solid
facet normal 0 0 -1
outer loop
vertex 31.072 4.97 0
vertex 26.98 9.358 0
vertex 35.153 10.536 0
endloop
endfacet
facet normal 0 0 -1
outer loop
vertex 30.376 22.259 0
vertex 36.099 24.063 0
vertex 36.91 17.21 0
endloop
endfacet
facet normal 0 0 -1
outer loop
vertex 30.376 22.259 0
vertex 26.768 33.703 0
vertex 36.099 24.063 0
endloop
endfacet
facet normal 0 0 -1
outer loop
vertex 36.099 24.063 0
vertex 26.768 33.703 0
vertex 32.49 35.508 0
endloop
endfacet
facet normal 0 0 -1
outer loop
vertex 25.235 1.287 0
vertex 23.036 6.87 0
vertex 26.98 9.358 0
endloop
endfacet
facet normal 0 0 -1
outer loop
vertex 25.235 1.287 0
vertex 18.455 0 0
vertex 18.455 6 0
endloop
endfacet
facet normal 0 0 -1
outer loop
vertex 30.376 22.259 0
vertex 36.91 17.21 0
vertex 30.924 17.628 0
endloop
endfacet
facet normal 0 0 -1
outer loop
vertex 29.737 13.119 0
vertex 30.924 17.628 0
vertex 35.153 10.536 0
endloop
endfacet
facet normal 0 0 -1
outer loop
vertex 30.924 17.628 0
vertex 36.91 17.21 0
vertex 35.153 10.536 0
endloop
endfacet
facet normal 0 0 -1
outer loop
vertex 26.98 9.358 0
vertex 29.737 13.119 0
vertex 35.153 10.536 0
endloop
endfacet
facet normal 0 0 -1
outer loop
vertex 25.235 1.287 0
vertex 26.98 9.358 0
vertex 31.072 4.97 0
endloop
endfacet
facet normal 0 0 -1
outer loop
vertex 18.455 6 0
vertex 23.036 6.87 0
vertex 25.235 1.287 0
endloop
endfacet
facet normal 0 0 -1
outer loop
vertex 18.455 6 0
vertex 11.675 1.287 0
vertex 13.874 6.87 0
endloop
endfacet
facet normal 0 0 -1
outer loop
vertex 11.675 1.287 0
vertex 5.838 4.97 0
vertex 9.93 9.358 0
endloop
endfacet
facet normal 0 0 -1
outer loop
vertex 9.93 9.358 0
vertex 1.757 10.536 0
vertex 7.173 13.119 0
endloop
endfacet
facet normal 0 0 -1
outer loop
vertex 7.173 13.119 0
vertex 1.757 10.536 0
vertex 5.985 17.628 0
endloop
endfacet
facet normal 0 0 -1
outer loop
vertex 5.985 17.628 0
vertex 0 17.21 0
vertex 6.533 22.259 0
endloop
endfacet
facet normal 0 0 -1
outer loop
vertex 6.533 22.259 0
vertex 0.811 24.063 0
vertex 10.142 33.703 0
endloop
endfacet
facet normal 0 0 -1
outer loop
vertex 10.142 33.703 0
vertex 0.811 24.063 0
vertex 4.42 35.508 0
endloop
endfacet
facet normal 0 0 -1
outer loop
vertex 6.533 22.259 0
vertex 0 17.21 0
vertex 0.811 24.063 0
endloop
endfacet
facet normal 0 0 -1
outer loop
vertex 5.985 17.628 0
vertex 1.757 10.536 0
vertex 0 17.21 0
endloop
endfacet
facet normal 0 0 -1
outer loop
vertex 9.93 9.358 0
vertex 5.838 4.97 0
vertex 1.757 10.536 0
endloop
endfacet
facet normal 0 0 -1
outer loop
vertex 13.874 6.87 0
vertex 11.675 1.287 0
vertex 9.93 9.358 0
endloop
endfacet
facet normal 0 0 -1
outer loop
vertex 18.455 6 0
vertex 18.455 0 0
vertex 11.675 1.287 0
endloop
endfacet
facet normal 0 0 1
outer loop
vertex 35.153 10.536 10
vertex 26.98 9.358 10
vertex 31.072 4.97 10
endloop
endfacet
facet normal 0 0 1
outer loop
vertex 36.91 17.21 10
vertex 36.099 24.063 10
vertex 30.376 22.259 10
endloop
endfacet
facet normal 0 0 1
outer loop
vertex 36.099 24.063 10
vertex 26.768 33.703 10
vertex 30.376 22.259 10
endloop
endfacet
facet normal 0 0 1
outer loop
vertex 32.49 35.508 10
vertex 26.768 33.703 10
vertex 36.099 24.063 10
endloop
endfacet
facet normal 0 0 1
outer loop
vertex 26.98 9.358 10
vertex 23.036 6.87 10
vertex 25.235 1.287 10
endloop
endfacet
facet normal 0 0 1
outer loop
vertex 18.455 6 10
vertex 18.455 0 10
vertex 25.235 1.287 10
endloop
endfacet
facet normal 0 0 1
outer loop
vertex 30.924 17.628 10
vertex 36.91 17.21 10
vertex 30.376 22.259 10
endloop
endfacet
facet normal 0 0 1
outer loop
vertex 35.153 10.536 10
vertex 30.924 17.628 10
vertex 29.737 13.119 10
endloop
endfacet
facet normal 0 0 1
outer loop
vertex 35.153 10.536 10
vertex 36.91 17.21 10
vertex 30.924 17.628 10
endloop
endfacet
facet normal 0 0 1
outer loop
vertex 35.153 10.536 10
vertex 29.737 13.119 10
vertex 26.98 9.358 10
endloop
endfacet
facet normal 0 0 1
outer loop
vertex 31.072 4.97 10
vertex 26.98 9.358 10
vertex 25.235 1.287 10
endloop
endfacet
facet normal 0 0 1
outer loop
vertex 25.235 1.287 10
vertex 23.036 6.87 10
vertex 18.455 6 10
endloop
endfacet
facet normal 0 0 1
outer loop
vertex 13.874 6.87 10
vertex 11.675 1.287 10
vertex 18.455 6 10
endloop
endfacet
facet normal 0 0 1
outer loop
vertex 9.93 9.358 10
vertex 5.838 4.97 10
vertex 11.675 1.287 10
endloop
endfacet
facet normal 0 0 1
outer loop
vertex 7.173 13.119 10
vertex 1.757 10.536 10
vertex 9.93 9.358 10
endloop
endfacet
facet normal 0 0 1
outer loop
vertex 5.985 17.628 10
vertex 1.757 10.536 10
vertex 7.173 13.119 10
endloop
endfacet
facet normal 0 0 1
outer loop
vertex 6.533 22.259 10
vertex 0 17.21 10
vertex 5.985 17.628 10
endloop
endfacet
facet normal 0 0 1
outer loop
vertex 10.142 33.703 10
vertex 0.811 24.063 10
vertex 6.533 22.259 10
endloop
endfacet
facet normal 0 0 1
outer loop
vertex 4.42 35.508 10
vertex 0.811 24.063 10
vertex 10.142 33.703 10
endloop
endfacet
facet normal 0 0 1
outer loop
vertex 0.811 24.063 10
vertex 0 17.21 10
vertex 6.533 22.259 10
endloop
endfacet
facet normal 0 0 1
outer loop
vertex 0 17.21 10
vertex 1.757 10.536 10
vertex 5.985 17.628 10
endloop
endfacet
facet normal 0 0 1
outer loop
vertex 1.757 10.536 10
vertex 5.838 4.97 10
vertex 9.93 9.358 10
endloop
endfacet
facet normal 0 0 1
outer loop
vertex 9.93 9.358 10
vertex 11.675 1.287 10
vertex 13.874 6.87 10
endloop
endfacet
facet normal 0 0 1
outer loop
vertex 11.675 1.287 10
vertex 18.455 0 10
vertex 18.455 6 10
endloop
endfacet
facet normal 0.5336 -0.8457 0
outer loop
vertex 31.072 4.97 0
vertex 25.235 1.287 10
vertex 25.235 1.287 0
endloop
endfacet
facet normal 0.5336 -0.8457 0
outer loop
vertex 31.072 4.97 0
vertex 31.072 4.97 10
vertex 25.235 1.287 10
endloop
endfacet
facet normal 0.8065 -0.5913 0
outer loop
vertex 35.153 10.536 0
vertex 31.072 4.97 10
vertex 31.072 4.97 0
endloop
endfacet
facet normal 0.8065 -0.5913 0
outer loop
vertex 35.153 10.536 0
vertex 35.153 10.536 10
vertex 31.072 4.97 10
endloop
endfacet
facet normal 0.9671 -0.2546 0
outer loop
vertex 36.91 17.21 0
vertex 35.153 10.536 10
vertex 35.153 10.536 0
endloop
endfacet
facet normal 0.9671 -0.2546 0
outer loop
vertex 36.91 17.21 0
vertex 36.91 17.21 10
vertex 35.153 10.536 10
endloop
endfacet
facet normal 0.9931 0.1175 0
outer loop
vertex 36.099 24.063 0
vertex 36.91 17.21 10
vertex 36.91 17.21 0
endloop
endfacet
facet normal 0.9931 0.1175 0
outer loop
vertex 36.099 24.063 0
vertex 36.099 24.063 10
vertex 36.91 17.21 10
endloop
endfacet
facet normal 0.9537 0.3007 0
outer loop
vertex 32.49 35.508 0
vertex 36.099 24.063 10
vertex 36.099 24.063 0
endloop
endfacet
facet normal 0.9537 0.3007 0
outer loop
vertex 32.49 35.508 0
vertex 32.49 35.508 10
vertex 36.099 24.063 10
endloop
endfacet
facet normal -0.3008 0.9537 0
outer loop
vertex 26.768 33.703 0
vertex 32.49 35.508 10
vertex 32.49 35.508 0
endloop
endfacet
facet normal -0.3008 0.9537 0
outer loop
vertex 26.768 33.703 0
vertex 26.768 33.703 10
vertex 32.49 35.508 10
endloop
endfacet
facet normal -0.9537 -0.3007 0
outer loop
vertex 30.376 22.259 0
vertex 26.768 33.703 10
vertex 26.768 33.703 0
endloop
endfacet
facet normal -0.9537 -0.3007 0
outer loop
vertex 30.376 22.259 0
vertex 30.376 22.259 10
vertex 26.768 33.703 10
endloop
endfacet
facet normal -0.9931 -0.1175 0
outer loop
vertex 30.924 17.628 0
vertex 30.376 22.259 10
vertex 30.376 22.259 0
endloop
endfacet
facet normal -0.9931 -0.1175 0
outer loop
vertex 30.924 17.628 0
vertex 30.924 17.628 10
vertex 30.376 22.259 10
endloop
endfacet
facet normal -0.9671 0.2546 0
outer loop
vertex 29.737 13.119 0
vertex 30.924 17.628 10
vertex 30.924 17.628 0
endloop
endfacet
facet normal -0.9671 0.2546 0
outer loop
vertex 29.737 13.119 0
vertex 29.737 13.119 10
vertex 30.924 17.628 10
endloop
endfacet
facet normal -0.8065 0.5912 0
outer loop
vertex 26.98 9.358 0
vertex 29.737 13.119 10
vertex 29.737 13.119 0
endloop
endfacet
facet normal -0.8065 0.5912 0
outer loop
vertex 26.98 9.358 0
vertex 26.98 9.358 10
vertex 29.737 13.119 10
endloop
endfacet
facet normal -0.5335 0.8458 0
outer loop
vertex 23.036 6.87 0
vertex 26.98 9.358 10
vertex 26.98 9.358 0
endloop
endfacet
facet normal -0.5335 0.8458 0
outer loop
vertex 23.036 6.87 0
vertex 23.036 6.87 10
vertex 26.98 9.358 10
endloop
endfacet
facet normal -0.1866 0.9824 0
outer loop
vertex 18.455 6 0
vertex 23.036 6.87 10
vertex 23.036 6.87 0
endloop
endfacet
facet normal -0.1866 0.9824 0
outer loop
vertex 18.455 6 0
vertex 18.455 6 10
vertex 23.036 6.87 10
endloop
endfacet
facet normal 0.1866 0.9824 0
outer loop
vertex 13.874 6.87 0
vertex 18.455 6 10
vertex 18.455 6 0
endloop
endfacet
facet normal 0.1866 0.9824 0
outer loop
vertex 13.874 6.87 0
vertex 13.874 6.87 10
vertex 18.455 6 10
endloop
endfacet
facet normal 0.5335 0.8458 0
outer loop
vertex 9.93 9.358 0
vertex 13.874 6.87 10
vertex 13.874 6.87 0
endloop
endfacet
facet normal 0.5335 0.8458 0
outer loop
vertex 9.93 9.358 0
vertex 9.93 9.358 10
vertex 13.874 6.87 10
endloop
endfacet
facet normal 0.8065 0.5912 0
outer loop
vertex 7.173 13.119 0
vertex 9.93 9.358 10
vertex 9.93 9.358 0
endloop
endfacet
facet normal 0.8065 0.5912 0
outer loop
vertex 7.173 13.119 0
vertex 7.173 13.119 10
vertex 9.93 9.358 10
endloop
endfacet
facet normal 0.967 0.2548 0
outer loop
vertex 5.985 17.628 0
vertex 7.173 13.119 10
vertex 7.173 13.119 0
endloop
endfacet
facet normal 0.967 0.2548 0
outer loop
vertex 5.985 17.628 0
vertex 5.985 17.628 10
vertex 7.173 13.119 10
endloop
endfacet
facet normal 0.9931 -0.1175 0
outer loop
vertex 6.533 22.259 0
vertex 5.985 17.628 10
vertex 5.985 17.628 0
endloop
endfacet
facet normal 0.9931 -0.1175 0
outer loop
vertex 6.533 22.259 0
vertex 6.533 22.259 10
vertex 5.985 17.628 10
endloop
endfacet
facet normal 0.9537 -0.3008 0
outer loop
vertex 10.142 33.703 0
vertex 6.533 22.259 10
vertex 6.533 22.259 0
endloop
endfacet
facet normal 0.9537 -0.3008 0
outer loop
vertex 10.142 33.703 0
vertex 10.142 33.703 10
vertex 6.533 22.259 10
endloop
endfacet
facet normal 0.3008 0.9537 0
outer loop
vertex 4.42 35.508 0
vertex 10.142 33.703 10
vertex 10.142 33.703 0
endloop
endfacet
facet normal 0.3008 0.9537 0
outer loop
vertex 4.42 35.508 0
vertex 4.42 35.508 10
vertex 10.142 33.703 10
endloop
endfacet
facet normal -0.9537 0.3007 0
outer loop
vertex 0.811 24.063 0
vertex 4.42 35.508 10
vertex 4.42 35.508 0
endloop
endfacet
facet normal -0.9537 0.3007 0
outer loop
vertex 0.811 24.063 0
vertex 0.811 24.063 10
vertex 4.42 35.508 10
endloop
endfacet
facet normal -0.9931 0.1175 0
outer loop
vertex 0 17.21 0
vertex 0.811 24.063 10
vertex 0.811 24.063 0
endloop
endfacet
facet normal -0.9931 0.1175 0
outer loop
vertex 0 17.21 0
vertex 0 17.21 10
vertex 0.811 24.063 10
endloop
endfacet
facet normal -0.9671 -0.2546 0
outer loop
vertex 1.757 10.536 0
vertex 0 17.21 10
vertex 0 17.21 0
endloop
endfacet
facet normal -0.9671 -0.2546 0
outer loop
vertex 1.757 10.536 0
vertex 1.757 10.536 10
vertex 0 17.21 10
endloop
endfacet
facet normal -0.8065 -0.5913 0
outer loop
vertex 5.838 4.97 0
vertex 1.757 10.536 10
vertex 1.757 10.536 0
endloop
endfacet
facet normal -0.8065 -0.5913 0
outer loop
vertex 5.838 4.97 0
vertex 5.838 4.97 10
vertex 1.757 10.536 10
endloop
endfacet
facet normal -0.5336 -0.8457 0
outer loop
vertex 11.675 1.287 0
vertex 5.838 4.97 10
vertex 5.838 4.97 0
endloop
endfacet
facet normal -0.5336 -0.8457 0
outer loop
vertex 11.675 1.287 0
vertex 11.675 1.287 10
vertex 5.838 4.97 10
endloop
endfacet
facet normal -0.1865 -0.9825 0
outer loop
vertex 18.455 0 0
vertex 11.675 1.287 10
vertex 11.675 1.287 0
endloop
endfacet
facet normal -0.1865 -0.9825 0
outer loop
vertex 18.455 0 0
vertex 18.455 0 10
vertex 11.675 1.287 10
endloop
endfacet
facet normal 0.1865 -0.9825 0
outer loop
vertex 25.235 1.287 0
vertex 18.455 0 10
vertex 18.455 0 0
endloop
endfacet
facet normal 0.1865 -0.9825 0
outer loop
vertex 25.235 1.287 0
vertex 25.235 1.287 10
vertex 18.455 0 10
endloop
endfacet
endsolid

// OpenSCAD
$fn = 32;

// ----------------------------------------------------------------------
// Clip blank: omega clip, 10 mm thick
// ----------------------------------------------------------------------

// --- parameters (mm) ---
profile_height = 10;      // extrusion height
profile_points = 26;      // points of the closed outline

profile = [[0.811, 24.063], [0, 17.21], [1.757, 10.536], [5.838, 4.97], [11.675, 1.287], [18.455, 0], [25.235, 1.287], [31.072, 4.97], [35.153, 10.536], [36.91, 17.21], [36.099, 24.063], [32.49, 35.508], [26.768, 33.703], [30.376, 22.259], [30.924, 17.628], [29.737, 13.119], [26.98, 9.358], [23.036, 6.87], [18.455, 6], [13.874, 6.87], [9.93, 9.358], [7.173, 13.119], [5.985, 17.628], [6.533, 22.259], [10.142, 33.703], [4.42, 35.508]];  // single closed polygon, 26 points, counter clockwise

// --- the one profile operation ---
linear_extrude(height = profile_height) polygon(points = profile);
